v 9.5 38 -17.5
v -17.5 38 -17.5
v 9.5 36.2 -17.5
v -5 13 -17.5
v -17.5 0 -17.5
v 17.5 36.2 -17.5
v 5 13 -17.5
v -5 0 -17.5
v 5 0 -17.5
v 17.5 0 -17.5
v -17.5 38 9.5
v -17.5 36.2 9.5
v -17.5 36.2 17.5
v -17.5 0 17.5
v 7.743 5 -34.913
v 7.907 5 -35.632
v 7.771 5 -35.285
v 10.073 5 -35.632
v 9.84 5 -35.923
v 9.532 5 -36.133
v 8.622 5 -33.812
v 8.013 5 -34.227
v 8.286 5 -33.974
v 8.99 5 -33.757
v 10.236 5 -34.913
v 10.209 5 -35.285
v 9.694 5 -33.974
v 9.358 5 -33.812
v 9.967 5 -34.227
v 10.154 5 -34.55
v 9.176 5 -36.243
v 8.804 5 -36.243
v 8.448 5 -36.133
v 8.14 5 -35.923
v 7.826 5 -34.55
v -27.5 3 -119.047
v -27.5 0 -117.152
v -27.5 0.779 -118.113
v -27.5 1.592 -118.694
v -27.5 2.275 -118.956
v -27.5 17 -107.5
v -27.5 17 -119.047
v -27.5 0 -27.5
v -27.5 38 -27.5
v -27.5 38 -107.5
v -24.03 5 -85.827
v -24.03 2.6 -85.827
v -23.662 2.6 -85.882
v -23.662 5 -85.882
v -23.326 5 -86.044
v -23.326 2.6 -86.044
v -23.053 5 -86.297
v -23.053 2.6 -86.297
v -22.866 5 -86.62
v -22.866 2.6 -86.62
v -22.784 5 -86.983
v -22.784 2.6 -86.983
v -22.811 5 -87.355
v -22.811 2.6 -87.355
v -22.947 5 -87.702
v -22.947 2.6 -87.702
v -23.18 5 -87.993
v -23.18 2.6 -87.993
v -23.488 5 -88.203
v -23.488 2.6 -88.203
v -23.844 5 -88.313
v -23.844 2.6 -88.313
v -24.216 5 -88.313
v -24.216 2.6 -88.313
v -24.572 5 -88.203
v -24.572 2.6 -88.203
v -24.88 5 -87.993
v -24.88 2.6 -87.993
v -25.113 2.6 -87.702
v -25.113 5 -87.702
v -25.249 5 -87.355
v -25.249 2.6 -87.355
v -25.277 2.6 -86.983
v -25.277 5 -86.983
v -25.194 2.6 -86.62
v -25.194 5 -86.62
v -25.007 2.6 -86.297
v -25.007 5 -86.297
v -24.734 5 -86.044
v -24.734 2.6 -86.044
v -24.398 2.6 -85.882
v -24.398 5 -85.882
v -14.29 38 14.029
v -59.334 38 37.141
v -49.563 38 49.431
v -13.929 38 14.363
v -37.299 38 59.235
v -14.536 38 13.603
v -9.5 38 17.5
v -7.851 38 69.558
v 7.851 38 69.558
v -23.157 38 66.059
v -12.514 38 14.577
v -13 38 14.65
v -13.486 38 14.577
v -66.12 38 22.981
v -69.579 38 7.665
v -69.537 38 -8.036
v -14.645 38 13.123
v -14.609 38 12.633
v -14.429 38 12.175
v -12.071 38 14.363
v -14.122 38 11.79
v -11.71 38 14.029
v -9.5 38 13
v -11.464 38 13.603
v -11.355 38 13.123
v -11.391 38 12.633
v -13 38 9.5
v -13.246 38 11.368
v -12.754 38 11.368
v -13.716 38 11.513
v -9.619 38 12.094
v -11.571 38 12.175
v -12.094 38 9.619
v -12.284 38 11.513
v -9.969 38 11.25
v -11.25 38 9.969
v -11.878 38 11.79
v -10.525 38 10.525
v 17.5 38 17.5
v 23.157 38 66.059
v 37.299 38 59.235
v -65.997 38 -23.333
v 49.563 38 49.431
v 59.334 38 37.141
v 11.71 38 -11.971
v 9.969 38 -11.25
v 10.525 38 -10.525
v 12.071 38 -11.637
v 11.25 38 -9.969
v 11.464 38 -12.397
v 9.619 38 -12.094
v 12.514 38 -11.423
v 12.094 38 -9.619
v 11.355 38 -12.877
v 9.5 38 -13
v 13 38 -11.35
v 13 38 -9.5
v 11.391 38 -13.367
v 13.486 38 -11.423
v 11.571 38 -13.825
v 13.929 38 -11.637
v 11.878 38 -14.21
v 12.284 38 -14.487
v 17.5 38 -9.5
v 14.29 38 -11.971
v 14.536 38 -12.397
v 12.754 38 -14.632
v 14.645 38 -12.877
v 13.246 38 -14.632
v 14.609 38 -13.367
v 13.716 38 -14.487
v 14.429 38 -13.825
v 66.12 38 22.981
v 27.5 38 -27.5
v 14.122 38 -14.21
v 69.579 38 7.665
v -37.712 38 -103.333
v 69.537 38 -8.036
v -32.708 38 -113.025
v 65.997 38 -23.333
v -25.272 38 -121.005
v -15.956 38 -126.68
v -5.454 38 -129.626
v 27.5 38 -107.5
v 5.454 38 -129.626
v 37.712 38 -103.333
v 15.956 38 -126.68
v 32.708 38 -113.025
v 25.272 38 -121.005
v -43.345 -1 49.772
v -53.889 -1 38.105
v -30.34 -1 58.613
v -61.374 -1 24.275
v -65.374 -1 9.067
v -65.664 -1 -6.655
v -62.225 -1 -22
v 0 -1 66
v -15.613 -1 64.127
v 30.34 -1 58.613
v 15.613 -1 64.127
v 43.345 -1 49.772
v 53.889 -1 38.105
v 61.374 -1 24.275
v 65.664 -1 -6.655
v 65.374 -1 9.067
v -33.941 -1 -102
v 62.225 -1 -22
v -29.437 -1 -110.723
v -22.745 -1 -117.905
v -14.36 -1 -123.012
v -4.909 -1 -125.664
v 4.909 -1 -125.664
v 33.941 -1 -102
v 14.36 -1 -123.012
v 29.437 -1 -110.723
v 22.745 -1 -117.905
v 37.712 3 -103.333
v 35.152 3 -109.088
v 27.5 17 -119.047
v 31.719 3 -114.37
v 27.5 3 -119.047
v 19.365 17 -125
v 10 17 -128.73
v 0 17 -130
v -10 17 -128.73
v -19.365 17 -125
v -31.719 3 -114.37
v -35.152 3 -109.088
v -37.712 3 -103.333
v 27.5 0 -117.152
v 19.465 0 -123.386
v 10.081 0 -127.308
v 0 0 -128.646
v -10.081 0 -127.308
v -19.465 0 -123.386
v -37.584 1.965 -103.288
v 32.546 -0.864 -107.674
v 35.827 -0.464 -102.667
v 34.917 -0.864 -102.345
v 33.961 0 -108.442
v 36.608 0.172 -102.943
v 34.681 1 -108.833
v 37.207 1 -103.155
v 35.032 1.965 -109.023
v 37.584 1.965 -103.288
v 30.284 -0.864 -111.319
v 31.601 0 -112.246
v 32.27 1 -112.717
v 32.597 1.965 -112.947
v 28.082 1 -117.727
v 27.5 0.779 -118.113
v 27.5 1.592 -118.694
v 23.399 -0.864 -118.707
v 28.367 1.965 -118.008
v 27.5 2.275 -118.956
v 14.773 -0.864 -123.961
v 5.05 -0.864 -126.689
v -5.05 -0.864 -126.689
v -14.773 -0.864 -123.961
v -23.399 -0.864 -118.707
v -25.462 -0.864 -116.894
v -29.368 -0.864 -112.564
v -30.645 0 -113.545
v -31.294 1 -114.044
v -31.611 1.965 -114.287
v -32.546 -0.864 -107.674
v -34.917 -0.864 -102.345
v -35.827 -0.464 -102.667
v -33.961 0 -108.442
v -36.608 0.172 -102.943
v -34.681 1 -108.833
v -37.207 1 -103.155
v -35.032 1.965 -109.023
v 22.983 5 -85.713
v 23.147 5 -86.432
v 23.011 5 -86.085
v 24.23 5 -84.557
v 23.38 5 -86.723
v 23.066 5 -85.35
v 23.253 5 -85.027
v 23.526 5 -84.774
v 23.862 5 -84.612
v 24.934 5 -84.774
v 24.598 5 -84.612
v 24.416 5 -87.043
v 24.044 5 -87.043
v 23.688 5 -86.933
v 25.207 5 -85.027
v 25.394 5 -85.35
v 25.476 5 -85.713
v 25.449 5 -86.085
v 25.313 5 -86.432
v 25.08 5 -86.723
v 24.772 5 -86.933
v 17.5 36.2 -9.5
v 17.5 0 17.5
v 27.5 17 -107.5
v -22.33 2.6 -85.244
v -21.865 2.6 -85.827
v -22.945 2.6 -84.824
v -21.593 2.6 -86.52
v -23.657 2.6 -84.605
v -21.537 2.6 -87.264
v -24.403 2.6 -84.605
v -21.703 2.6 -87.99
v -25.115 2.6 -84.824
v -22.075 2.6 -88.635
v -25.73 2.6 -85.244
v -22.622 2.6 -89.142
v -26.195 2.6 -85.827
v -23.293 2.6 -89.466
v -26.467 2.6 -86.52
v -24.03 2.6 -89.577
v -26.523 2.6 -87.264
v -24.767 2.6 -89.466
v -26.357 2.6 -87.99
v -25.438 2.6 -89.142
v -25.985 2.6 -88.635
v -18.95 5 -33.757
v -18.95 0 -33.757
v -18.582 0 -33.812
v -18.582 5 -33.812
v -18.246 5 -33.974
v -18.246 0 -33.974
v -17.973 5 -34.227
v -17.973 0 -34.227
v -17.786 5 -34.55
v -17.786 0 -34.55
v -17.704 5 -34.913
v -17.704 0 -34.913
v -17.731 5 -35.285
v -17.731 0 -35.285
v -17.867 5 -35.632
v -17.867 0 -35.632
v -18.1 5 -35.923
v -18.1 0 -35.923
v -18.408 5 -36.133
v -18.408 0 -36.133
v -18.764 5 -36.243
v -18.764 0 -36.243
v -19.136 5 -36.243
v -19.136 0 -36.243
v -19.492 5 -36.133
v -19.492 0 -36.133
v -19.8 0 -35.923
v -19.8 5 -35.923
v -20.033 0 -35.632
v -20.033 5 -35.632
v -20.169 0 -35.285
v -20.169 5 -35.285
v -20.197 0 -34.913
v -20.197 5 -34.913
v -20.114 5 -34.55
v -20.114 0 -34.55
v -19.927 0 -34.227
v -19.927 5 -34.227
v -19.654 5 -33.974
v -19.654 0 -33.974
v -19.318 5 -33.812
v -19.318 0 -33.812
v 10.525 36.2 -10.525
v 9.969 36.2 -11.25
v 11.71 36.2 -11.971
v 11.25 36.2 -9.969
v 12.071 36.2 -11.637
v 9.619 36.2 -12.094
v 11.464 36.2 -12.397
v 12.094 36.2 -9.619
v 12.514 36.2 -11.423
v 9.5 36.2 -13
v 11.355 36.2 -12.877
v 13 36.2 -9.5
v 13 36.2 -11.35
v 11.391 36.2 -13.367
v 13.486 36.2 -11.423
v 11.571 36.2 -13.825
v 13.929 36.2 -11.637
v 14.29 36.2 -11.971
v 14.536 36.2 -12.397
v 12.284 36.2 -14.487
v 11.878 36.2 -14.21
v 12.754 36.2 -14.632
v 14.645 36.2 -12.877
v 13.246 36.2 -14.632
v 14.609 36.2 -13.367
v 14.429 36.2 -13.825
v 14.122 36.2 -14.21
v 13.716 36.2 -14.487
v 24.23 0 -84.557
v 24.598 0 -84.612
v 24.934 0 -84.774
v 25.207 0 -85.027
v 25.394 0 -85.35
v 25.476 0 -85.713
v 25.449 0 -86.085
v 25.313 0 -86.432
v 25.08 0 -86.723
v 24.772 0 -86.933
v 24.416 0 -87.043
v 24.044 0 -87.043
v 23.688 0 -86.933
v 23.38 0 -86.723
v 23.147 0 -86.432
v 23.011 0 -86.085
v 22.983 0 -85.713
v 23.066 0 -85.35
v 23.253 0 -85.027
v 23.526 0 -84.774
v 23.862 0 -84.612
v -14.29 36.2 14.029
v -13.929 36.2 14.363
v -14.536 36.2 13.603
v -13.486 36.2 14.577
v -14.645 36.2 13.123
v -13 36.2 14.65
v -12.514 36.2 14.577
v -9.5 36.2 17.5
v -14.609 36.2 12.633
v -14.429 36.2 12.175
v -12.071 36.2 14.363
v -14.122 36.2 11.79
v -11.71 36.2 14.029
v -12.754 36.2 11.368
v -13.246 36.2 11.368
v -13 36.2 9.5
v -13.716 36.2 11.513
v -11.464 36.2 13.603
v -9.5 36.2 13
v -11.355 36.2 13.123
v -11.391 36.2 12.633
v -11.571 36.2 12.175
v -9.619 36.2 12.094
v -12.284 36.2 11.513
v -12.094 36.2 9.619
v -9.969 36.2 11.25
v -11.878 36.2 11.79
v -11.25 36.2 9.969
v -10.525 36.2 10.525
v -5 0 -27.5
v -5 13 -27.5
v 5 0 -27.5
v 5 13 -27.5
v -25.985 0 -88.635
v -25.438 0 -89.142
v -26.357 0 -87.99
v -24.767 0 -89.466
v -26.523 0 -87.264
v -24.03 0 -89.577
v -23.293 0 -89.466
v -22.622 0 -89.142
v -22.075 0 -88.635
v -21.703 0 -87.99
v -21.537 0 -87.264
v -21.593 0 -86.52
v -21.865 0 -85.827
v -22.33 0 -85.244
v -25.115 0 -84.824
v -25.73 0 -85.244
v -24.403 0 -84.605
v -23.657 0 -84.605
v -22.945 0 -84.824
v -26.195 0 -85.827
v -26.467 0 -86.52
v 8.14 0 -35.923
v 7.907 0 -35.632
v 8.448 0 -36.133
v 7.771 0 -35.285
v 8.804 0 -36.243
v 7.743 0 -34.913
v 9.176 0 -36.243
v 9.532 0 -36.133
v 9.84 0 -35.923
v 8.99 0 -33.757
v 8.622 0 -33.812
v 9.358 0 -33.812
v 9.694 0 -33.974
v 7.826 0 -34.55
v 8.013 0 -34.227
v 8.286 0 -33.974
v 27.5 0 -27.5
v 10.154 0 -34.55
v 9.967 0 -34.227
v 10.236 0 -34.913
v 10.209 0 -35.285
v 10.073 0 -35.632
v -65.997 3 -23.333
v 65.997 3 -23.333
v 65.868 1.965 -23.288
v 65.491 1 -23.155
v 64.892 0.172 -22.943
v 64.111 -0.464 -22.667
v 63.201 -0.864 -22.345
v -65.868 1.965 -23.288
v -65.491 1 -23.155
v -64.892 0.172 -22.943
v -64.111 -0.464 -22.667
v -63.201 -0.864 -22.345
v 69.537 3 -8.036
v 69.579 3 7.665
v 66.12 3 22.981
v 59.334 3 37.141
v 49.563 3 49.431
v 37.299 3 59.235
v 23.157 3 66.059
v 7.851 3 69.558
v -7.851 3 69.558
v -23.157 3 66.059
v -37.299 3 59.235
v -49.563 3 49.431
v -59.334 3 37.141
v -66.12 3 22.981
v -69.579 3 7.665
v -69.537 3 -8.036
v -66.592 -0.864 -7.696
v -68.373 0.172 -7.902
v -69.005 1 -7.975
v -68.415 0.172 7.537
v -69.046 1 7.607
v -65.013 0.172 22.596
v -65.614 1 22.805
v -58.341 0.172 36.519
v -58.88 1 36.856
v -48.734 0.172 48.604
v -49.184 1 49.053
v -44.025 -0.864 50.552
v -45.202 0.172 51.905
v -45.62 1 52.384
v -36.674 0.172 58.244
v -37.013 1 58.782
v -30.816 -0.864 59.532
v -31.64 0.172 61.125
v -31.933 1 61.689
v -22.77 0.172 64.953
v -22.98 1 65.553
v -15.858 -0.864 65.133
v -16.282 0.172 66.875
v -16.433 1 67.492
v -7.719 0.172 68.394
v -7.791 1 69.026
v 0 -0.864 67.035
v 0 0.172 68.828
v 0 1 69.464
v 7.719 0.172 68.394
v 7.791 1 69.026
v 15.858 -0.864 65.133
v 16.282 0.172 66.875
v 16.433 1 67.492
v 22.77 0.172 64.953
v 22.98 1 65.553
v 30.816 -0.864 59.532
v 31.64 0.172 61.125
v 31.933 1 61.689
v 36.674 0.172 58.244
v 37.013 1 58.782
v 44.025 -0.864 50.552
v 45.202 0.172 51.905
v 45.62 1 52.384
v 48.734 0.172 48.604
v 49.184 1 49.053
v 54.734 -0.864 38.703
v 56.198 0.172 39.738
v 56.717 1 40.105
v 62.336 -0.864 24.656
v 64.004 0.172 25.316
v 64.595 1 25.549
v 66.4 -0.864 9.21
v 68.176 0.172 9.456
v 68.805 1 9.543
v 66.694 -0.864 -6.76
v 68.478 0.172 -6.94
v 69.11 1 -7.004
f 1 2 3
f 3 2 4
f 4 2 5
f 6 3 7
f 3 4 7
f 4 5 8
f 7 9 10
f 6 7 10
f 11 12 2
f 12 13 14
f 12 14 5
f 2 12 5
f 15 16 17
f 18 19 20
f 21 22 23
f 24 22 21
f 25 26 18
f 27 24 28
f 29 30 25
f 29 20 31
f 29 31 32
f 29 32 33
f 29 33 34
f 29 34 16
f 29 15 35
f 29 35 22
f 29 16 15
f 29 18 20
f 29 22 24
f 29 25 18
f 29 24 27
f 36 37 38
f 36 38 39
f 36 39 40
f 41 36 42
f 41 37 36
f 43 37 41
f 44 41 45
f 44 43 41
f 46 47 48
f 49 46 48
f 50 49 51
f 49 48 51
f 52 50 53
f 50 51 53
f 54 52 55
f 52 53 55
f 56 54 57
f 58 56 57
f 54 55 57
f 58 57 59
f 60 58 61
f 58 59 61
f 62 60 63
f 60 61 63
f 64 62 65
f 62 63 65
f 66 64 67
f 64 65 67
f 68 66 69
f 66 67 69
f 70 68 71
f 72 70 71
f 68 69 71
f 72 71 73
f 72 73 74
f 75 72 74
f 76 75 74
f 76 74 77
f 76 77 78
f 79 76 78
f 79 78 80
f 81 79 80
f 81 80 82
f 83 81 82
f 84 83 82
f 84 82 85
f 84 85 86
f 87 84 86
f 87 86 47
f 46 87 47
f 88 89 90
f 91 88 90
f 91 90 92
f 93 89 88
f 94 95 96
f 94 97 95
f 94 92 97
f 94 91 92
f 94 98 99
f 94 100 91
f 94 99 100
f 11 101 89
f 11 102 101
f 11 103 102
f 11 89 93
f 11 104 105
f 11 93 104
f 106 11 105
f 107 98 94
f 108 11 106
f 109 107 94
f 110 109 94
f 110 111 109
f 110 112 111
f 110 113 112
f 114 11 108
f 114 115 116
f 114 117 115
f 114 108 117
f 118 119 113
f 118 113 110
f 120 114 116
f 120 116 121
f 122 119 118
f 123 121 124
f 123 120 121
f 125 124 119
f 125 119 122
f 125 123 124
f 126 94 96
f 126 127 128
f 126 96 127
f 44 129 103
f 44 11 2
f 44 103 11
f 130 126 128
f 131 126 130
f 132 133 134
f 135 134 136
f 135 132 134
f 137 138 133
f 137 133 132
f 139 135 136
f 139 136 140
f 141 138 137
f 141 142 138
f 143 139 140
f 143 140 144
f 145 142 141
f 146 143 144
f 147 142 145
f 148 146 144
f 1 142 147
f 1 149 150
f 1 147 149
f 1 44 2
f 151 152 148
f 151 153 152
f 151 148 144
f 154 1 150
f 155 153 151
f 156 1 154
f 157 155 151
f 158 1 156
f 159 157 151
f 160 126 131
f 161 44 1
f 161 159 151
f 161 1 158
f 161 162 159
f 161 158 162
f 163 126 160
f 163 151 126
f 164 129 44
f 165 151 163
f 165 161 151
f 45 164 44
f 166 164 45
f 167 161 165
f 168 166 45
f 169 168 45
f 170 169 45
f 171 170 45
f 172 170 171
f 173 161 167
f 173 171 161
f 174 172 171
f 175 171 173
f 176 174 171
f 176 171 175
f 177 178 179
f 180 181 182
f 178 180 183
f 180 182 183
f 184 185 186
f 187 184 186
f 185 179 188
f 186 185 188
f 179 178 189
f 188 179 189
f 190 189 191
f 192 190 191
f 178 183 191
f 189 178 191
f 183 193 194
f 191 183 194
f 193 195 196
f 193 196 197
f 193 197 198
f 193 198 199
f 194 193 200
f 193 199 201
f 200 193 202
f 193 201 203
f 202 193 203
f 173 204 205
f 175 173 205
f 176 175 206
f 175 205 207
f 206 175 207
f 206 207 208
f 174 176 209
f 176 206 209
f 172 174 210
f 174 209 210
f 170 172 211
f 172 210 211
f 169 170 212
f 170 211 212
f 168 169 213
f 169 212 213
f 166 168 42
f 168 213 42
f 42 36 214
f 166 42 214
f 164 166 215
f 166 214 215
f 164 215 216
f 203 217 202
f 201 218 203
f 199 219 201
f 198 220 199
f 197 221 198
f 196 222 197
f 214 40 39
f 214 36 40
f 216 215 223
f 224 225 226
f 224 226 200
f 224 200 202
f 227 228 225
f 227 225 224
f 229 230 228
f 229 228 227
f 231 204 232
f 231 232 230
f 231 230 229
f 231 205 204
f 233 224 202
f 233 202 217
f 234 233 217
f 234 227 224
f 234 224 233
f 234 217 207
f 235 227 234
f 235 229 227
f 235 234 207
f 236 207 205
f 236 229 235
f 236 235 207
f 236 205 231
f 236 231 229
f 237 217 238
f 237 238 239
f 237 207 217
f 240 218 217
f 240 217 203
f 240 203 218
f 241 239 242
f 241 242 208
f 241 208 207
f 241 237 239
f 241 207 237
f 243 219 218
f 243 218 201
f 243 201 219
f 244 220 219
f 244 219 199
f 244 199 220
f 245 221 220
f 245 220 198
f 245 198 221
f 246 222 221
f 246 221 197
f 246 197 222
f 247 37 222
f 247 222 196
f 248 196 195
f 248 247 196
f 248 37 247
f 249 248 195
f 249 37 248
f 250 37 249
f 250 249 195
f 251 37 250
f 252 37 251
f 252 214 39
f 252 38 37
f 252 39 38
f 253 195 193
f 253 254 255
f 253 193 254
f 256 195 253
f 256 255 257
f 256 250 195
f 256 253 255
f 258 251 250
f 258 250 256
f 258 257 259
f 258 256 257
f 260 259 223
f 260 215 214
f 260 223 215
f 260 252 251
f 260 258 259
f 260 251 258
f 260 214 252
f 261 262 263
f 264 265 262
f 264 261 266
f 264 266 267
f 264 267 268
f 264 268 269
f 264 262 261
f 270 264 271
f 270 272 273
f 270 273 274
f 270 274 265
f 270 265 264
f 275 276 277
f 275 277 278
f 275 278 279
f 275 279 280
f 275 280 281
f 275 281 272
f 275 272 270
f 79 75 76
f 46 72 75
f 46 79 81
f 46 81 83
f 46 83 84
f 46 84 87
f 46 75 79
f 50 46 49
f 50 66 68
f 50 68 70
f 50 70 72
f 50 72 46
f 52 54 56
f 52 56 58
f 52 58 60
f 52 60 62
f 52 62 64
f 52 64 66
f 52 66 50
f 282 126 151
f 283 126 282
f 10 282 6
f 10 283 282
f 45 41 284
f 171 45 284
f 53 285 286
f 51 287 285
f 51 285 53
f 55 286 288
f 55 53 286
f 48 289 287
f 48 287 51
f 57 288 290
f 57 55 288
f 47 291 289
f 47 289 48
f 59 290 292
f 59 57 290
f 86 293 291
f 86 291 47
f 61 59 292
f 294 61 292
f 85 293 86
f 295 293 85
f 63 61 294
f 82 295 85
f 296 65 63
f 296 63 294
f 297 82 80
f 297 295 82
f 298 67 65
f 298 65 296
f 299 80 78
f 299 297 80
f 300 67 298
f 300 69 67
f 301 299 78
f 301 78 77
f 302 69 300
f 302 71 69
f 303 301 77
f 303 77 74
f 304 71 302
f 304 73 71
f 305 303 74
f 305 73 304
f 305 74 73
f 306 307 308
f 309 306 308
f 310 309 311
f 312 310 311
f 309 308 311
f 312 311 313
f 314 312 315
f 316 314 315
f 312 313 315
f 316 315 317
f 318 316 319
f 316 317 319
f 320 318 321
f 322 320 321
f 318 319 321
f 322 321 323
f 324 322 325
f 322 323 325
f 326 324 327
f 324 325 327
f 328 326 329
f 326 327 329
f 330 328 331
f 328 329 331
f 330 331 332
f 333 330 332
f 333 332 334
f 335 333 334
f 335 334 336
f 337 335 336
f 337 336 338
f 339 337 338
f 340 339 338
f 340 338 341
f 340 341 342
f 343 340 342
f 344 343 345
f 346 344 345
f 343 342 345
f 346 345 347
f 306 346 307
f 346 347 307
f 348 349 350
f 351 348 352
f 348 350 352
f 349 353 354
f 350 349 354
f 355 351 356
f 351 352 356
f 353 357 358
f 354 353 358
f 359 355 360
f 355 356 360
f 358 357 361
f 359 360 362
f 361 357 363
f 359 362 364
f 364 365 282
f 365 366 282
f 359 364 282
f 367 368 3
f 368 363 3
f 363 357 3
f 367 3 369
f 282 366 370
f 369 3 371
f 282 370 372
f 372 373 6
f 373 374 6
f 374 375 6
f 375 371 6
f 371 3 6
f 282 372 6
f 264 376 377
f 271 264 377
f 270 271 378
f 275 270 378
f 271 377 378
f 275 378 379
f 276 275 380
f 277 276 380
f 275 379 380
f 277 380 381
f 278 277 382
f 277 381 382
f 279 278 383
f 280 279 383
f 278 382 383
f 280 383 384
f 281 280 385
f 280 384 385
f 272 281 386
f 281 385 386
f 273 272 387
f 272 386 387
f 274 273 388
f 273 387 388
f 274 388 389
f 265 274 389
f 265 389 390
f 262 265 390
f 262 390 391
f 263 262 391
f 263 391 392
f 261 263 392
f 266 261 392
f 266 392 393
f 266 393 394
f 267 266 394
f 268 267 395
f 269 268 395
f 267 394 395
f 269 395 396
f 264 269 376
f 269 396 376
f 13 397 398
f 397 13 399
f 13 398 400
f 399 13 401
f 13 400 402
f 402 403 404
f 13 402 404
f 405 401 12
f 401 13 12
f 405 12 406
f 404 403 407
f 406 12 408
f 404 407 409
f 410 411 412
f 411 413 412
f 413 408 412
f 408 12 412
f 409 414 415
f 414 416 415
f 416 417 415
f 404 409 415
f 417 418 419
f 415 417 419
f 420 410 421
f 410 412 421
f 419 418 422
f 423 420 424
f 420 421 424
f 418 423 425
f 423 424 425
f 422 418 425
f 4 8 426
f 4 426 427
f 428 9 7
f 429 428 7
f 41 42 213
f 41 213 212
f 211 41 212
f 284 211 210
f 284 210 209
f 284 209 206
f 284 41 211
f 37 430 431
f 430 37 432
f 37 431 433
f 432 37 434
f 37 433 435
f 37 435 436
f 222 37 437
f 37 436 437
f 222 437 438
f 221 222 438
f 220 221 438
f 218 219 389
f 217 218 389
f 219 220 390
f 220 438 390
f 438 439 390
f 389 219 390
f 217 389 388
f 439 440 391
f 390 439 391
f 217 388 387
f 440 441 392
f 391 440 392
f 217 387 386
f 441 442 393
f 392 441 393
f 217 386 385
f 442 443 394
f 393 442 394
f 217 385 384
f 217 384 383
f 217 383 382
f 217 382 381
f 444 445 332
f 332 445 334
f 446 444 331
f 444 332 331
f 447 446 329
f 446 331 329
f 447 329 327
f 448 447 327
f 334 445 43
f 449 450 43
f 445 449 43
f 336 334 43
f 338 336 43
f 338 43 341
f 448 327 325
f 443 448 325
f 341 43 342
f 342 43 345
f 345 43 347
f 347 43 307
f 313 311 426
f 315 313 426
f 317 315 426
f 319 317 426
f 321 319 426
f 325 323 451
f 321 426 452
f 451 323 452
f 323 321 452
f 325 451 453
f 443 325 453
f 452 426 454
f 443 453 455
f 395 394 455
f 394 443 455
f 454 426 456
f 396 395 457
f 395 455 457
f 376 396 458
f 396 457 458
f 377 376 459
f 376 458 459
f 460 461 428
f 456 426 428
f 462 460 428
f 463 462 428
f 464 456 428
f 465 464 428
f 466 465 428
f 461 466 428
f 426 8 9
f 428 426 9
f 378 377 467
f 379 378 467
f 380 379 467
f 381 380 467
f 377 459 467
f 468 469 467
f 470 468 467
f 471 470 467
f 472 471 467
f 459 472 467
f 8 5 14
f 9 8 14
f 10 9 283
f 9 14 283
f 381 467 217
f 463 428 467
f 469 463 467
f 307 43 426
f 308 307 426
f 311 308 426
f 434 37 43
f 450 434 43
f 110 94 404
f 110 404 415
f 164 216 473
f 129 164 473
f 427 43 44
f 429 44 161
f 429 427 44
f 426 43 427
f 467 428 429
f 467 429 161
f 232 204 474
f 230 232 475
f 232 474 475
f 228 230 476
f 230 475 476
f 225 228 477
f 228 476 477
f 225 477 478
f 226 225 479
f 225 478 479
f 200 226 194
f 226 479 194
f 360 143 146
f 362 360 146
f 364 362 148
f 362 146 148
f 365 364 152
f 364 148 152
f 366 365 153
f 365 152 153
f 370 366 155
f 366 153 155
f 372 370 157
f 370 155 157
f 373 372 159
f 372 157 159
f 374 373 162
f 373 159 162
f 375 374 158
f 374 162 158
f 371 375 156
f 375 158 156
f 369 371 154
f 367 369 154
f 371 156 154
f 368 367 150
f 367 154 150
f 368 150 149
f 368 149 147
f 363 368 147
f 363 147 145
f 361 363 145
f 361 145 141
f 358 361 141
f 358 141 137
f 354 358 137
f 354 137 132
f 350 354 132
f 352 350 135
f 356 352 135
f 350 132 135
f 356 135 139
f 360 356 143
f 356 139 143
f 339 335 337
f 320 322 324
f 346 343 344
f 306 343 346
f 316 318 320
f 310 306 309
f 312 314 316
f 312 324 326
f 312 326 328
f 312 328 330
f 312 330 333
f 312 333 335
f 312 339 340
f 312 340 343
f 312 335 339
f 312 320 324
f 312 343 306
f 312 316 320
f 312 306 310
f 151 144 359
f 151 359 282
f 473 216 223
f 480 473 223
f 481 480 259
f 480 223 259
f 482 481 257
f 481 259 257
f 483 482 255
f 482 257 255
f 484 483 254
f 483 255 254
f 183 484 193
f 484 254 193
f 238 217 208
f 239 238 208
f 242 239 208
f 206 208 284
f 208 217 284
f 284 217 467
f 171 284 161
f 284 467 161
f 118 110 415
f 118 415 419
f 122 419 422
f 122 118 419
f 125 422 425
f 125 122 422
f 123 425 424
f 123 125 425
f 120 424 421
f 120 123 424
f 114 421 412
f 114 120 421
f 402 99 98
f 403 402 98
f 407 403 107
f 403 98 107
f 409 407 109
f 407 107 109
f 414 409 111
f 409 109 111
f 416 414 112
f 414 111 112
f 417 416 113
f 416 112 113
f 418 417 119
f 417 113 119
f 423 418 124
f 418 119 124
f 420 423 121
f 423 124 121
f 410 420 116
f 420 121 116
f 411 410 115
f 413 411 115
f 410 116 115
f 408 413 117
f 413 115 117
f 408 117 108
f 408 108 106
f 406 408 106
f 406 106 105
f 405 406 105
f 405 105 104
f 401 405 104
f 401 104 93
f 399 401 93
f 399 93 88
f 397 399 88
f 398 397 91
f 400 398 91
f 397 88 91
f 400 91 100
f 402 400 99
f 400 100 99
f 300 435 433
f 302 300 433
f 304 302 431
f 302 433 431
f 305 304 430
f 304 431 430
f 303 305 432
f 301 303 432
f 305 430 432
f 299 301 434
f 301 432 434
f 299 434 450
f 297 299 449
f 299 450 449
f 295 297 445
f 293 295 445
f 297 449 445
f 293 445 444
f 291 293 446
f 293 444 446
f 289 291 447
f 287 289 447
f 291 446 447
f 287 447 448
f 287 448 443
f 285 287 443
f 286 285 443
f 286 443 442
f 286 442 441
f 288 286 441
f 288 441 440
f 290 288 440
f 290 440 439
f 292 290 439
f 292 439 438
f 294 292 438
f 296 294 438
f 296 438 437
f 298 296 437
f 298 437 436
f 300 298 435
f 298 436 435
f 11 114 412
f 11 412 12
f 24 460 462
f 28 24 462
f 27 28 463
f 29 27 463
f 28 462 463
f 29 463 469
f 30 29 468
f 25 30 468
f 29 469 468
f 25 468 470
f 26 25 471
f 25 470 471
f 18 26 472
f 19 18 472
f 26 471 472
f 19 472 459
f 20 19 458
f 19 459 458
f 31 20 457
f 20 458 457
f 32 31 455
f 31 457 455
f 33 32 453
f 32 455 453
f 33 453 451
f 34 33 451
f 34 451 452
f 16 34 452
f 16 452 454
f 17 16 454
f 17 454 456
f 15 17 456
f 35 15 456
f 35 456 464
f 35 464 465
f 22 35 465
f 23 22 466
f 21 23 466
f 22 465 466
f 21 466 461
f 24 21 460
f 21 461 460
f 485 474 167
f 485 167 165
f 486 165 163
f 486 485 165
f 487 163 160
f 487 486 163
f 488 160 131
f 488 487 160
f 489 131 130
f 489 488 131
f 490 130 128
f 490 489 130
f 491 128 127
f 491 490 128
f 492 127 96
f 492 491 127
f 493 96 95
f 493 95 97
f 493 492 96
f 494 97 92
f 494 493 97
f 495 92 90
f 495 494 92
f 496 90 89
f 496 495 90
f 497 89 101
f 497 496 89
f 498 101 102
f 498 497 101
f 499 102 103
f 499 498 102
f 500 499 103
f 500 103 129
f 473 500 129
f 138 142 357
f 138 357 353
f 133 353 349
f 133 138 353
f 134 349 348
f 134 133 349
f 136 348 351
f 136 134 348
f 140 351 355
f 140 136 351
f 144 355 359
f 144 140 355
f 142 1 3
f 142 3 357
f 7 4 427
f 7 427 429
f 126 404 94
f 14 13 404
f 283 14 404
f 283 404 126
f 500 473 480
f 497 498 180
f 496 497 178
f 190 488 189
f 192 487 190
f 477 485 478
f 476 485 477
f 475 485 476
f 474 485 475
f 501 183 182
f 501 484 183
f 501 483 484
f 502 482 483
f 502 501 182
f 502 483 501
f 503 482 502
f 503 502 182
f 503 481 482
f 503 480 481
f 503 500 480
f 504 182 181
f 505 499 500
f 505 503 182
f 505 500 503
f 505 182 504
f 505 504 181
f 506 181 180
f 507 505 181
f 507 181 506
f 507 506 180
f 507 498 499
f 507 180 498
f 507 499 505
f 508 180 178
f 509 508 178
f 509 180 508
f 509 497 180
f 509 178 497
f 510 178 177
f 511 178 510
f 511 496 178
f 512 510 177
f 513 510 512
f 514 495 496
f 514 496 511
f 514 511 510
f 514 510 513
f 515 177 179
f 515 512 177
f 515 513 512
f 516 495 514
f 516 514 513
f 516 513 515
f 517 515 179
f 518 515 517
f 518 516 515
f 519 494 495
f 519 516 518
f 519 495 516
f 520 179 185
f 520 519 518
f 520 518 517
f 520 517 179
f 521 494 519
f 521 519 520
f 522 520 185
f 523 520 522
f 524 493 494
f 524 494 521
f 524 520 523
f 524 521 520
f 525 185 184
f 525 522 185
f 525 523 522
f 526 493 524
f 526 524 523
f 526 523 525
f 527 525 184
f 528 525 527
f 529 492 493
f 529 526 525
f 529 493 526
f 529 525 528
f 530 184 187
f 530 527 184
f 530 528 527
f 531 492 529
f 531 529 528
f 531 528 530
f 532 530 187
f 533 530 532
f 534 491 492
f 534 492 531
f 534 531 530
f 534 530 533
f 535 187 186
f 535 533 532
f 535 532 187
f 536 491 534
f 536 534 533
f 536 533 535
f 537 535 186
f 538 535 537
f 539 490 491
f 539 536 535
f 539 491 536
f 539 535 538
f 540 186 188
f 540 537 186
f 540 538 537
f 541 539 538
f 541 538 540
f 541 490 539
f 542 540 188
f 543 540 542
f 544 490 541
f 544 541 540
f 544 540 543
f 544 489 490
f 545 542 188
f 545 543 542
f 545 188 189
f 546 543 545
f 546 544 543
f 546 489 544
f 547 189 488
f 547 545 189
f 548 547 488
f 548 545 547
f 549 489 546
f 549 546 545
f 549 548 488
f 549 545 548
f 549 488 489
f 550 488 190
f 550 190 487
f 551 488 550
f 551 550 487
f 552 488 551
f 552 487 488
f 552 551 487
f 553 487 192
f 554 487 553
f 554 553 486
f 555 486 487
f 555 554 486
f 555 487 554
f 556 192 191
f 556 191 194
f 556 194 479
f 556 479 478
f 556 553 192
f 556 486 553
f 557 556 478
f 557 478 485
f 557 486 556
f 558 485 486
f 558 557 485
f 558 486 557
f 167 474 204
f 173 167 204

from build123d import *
from build123d.topology import SkipClean

# Parameters (mm, degrees)
ESQUISSE2_W             = 35
ESQUISSE2_H             = 35
ESQUISSE2_W_2           = 55
ESQUISSE2_H_2           = 80
BOSS_EXTRU_1_DEPTH      = 38
BOSS_EXTRU_2_START      = -1
BOSS_EXTRU_2_DEPTH      = 1
CONG_2_R                = 4
ESQUISSE3_W             = 55
ESQUISSE3_H             = 17
ENL_V_MAT_EXTRU_1_DEPTH = 195.551407124
ESQUISSE4_W             = 10
ESQUISSE4_H             = 13
ENL_V_MAT_EXTRU_2_DEPTH = 138.841394442
ESQUISSE5_R             = 1.65
BOSS_EXTRU_3_DEPTH      = 1.8
ESQUISSE6_R             = 2.5
BOSS_EXTRU_4_DEPTH      = 2.6
ESQUISSE6_3_R           = 1.25
BOSS_EXTRU_5_DEPTH      = 5


with BuildPart() as part:
    # Esquisse2 → Boss.-Extru.1 (new body)
    with BuildSketch(Plane(origin=(0, 0, 0), x_dir=(1, 0, 0), z_dir=(0, 1, 0))):
        with BuildLine():
            Line((-65.996632911, 23.333333333), (-37.712361663, 103.333333333))
            ThreePointArc((-37.712361663, 103.333333333), (0, 130), (37.712361663, 103.333333333))
            Line((37.712361663, 103.333333333), (65.996632911, 23.333333333))
            ThreePointArc((65.996632911, 23.333333333), (0, -70), (-65.996632911, 23.333333333))
        make_face()
        Rectangle(ESQUISSE2_W, ESQUISSE2_H, mode=Mode.SUBTRACT)
        with Locations((0, 67.5)):
            Rectangle(ESQUISSE2_W_2, ESQUISSE2_H_2, mode=Mode.SUBTRACT)
    extrude(amount=BOSS_EXTRU_1_DEPTH)

    # Esquisse2<2> → Boss.-Extru.2 (add)
    with SkipClean():  # the faces are left unmerged after this step: merging them gives an invalid solid
        with BuildSketch(Plane(origin=(0, 0, 0), x_dir=(1, 0, 0), z_dir=(0, 1, 0)).offset(BOSS_EXTRU_2_START)):
            with BuildLine():
                Line((-37.712361663, 103.333333333), (-65.996632911, 23.333333333))
                ThreePointArc((-65.996632911, 23.333333333), (0, -70), (65.996632911, 23.333333333))
                Line((65.996632911, 23.333333333), (37.712361663, 103.333333333))
                ThreePointArc((37.712361663, 103.333333333), (0, 130), (-37.712361663, 103.333333333))
            make_face()
        extrude(amount=BOSS_EXTRU_2_DEPTH)

    # Congé2
    # the kernel refuses this fillet: 4 mm, written as the material it takes off along each edge
    with BuildSketch(Plane(origin=(0, -1, 0), x_dir=(-0.9428090415820636, 0, -0.33333333333333304), z_dir=(0.33333333333333304, 0, -0.9428090415820636))) as cong_2_piece_1:
        with BuildLine():
            CenterArc((70 - CONG_2_R, CONG_2_R), CONG_2_R, 270, 90)
            Line((70 - CONG_2_R, 0), (70, 0))
            Line((70, 0), (70, CONG_2_R))
        make_face()
    revolve(axis=Axis((0, -1, 0), (0, 1, 0)), revolution_arc=218.942441269, mode=Mode.SUBTRACT)
    with BuildSketch(Plane(origin=(65.996632911, -1, -23.333333333), x_dir=(-0.9428090415820634, 0, 0.33333333333333354), z_dir=(-0.33333333333333354, 0, -0.9428090415820634))) as cong_2_piece_2:
        with BuildLine():
            CenterArc((CONG_2_R, CONG_2_R), CONG_2_R, 180, 90)
            Line((0, CONG_2_R), (0, 0))
            Line((0, 0), (CONG_2_R, 0))
        make_face()
    extrude(amount=84.852813742, mode=Mode.SUBTRACT)
    with BuildSketch(Plane(origin=(-37.712361663, -1, -103.333333333), x_dir=(0, 1, 0), z_dir=(-0.3333333333333333, 0, 0.9428090415820635))) as cong_2_piece_3:
        with BuildLine():
            CenterArc((CONG_2_R, -CONG_2_R), CONG_2_R, 90, 90)
            Line((0, -CONG_2_R), (0, 0))
            Line((0, 0), (CONG_2_R, 0))
        make_face()
    extrude(amount=84.852813742, mode=Mode.SUBTRACT)
    with BuildSketch(Plane(origin=(0, -1, -90), x_dir=(0.9428090415820632, 0, -0.3333333333333337), z_dir=(0.3333333333333337, 0, 0.9428090415820632))) as cong_2_piece_4:
        with BuildLine():
            CenterArc((40 - CONG_2_R, CONG_2_R), CONG_2_R, 270, 90)
            Line((40 - CONG_2_R, 0), (40, 0))
            Line((40, 0), (40, CONG_2_R))
        make_face()
    revolve(axis=Axis((0, -1, -90), (0, 1, 0)), revolution_arc=141.057558731, mode=Mode.SUBTRACT)

    # Esquisse3 → Enlèv. mat.-Extru.1 (cut, through all)
    with BuildSketch(Plane.XY.offset(-107.5)):
        with Locations((0, 8.5)):
            Rectangle(ESQUISSE3_W, ESQUISSE3_H)
    extrude(amount=-ENL_V_MAT_EXTRU_1_DEPTH, mode=Mode.SUBTRACT)

    # Esquisse4 → Enlèv. mat.-Extru.2 (cut, through all)
    with BuildSketch(Plane.XY.offset(-17.5)):
        with Locations((0, 6.5)):
            Rectangle(ESQUISSE4_W, ESQUISSE4_H)
    extrude(amount=-ENL_V_MAT_EXTRU_2_DEPTH, mode=Mode.SUBTRACT)

    # Esquisse5 → Boss.-Extru.3 (add)
    # profile 1 of 2: a face of its own
    with BuildSketch(Plane(origin=(0, 38, 0), x_dir=(1, 0, 0), z_dir=(0, 1, 0))):
        with BuildLine():
            Line((-9.5, -17.5), (-9.5, -13))
            ThreePointArc((-9.5, -13), (-10.525126266, -10.525126266), (-13, -9.5))
            Line((-13, -9.5), (-17.5, -9.5))
            Line((-17.5, -9.5), (-17.5, -17.5))
            Line((-17.5, -17.5), (-9.5, -17.5))
        make_face()
        with Locations(Location((-13, -13, 0), (0, 0, 270))):
            Circle(ESQUISSE5_R, mode=Mode.SUBTRACT)
    # profile 2 of 2: a face of its own
    with BuildSketch(Plane(origin=(0, 38, 0), x_dir=(1, 0, 0), z_dir=(0, 1, 0))):
        with BuildLine():
            Line((13, 9.5), (17.5, 9.5))
            Line((17.5, 9.5), (17.5, 17.5))
            Line((17.5, 17.5), (9.5, 17.5))
            Line((9.5, 17.5), (9.5, 13))
            ThreePointArc((9.5, 13), (10.525126266, 10.525126266), (13, 9.5))
        make_face()
        with Locations(Location((13, 13, 0), (0, 0, 270))):
            Circle(ESQUISSE5_R, mode=Mode.SUBTRACT)
    extrude(amount=-BOSS_EXTRU_3_DEPTH)

    # Esquisse6 → Boss.-Extru.4 (add)
    with BuildSketch(Plane(origin=(0, 0, 0), x_dir=(1, 0, 0), z_dir=(0, 1, 0))):
        with Locations(Location((-24.0300102, 87.0767006, 0), (0, 0, 90))):
            Circle(ESQUISSE6_R)
    extrude(amount=BOSS_EXTRU_4_DEPTH)

    # Esquisse6<3> → Boss.-Extru.5 (add)
    with BuildSketch(Plane(origin=(0, 0, 0), x_dir=(1, 0, 0), z_dir=(0, 1, 0))):
        with Locations(Location((-18.9500102, 35.0067006, 0), (0, 0, 270))):
            Circle(ESQUISSE6_3_R)
        with Locations(Location((8.9899898, 35.0067006, 0), (0, 0, 270))):
            Circle(ESQUISSE6_3_R)
        with Locations(Location((24.2299898, 85.8067006, 0), (0, 0, 270))):
            Circle(ESQUISSE6_3_R)
        with Locations(Location((-24.0300102, 87.0767006, 0), (0, 0, 270))):
            Circle(ESQUISSE6_3_R)
    extrude(amount=BOSS_EXTRU_5_DEPTH)


solid = part.part
